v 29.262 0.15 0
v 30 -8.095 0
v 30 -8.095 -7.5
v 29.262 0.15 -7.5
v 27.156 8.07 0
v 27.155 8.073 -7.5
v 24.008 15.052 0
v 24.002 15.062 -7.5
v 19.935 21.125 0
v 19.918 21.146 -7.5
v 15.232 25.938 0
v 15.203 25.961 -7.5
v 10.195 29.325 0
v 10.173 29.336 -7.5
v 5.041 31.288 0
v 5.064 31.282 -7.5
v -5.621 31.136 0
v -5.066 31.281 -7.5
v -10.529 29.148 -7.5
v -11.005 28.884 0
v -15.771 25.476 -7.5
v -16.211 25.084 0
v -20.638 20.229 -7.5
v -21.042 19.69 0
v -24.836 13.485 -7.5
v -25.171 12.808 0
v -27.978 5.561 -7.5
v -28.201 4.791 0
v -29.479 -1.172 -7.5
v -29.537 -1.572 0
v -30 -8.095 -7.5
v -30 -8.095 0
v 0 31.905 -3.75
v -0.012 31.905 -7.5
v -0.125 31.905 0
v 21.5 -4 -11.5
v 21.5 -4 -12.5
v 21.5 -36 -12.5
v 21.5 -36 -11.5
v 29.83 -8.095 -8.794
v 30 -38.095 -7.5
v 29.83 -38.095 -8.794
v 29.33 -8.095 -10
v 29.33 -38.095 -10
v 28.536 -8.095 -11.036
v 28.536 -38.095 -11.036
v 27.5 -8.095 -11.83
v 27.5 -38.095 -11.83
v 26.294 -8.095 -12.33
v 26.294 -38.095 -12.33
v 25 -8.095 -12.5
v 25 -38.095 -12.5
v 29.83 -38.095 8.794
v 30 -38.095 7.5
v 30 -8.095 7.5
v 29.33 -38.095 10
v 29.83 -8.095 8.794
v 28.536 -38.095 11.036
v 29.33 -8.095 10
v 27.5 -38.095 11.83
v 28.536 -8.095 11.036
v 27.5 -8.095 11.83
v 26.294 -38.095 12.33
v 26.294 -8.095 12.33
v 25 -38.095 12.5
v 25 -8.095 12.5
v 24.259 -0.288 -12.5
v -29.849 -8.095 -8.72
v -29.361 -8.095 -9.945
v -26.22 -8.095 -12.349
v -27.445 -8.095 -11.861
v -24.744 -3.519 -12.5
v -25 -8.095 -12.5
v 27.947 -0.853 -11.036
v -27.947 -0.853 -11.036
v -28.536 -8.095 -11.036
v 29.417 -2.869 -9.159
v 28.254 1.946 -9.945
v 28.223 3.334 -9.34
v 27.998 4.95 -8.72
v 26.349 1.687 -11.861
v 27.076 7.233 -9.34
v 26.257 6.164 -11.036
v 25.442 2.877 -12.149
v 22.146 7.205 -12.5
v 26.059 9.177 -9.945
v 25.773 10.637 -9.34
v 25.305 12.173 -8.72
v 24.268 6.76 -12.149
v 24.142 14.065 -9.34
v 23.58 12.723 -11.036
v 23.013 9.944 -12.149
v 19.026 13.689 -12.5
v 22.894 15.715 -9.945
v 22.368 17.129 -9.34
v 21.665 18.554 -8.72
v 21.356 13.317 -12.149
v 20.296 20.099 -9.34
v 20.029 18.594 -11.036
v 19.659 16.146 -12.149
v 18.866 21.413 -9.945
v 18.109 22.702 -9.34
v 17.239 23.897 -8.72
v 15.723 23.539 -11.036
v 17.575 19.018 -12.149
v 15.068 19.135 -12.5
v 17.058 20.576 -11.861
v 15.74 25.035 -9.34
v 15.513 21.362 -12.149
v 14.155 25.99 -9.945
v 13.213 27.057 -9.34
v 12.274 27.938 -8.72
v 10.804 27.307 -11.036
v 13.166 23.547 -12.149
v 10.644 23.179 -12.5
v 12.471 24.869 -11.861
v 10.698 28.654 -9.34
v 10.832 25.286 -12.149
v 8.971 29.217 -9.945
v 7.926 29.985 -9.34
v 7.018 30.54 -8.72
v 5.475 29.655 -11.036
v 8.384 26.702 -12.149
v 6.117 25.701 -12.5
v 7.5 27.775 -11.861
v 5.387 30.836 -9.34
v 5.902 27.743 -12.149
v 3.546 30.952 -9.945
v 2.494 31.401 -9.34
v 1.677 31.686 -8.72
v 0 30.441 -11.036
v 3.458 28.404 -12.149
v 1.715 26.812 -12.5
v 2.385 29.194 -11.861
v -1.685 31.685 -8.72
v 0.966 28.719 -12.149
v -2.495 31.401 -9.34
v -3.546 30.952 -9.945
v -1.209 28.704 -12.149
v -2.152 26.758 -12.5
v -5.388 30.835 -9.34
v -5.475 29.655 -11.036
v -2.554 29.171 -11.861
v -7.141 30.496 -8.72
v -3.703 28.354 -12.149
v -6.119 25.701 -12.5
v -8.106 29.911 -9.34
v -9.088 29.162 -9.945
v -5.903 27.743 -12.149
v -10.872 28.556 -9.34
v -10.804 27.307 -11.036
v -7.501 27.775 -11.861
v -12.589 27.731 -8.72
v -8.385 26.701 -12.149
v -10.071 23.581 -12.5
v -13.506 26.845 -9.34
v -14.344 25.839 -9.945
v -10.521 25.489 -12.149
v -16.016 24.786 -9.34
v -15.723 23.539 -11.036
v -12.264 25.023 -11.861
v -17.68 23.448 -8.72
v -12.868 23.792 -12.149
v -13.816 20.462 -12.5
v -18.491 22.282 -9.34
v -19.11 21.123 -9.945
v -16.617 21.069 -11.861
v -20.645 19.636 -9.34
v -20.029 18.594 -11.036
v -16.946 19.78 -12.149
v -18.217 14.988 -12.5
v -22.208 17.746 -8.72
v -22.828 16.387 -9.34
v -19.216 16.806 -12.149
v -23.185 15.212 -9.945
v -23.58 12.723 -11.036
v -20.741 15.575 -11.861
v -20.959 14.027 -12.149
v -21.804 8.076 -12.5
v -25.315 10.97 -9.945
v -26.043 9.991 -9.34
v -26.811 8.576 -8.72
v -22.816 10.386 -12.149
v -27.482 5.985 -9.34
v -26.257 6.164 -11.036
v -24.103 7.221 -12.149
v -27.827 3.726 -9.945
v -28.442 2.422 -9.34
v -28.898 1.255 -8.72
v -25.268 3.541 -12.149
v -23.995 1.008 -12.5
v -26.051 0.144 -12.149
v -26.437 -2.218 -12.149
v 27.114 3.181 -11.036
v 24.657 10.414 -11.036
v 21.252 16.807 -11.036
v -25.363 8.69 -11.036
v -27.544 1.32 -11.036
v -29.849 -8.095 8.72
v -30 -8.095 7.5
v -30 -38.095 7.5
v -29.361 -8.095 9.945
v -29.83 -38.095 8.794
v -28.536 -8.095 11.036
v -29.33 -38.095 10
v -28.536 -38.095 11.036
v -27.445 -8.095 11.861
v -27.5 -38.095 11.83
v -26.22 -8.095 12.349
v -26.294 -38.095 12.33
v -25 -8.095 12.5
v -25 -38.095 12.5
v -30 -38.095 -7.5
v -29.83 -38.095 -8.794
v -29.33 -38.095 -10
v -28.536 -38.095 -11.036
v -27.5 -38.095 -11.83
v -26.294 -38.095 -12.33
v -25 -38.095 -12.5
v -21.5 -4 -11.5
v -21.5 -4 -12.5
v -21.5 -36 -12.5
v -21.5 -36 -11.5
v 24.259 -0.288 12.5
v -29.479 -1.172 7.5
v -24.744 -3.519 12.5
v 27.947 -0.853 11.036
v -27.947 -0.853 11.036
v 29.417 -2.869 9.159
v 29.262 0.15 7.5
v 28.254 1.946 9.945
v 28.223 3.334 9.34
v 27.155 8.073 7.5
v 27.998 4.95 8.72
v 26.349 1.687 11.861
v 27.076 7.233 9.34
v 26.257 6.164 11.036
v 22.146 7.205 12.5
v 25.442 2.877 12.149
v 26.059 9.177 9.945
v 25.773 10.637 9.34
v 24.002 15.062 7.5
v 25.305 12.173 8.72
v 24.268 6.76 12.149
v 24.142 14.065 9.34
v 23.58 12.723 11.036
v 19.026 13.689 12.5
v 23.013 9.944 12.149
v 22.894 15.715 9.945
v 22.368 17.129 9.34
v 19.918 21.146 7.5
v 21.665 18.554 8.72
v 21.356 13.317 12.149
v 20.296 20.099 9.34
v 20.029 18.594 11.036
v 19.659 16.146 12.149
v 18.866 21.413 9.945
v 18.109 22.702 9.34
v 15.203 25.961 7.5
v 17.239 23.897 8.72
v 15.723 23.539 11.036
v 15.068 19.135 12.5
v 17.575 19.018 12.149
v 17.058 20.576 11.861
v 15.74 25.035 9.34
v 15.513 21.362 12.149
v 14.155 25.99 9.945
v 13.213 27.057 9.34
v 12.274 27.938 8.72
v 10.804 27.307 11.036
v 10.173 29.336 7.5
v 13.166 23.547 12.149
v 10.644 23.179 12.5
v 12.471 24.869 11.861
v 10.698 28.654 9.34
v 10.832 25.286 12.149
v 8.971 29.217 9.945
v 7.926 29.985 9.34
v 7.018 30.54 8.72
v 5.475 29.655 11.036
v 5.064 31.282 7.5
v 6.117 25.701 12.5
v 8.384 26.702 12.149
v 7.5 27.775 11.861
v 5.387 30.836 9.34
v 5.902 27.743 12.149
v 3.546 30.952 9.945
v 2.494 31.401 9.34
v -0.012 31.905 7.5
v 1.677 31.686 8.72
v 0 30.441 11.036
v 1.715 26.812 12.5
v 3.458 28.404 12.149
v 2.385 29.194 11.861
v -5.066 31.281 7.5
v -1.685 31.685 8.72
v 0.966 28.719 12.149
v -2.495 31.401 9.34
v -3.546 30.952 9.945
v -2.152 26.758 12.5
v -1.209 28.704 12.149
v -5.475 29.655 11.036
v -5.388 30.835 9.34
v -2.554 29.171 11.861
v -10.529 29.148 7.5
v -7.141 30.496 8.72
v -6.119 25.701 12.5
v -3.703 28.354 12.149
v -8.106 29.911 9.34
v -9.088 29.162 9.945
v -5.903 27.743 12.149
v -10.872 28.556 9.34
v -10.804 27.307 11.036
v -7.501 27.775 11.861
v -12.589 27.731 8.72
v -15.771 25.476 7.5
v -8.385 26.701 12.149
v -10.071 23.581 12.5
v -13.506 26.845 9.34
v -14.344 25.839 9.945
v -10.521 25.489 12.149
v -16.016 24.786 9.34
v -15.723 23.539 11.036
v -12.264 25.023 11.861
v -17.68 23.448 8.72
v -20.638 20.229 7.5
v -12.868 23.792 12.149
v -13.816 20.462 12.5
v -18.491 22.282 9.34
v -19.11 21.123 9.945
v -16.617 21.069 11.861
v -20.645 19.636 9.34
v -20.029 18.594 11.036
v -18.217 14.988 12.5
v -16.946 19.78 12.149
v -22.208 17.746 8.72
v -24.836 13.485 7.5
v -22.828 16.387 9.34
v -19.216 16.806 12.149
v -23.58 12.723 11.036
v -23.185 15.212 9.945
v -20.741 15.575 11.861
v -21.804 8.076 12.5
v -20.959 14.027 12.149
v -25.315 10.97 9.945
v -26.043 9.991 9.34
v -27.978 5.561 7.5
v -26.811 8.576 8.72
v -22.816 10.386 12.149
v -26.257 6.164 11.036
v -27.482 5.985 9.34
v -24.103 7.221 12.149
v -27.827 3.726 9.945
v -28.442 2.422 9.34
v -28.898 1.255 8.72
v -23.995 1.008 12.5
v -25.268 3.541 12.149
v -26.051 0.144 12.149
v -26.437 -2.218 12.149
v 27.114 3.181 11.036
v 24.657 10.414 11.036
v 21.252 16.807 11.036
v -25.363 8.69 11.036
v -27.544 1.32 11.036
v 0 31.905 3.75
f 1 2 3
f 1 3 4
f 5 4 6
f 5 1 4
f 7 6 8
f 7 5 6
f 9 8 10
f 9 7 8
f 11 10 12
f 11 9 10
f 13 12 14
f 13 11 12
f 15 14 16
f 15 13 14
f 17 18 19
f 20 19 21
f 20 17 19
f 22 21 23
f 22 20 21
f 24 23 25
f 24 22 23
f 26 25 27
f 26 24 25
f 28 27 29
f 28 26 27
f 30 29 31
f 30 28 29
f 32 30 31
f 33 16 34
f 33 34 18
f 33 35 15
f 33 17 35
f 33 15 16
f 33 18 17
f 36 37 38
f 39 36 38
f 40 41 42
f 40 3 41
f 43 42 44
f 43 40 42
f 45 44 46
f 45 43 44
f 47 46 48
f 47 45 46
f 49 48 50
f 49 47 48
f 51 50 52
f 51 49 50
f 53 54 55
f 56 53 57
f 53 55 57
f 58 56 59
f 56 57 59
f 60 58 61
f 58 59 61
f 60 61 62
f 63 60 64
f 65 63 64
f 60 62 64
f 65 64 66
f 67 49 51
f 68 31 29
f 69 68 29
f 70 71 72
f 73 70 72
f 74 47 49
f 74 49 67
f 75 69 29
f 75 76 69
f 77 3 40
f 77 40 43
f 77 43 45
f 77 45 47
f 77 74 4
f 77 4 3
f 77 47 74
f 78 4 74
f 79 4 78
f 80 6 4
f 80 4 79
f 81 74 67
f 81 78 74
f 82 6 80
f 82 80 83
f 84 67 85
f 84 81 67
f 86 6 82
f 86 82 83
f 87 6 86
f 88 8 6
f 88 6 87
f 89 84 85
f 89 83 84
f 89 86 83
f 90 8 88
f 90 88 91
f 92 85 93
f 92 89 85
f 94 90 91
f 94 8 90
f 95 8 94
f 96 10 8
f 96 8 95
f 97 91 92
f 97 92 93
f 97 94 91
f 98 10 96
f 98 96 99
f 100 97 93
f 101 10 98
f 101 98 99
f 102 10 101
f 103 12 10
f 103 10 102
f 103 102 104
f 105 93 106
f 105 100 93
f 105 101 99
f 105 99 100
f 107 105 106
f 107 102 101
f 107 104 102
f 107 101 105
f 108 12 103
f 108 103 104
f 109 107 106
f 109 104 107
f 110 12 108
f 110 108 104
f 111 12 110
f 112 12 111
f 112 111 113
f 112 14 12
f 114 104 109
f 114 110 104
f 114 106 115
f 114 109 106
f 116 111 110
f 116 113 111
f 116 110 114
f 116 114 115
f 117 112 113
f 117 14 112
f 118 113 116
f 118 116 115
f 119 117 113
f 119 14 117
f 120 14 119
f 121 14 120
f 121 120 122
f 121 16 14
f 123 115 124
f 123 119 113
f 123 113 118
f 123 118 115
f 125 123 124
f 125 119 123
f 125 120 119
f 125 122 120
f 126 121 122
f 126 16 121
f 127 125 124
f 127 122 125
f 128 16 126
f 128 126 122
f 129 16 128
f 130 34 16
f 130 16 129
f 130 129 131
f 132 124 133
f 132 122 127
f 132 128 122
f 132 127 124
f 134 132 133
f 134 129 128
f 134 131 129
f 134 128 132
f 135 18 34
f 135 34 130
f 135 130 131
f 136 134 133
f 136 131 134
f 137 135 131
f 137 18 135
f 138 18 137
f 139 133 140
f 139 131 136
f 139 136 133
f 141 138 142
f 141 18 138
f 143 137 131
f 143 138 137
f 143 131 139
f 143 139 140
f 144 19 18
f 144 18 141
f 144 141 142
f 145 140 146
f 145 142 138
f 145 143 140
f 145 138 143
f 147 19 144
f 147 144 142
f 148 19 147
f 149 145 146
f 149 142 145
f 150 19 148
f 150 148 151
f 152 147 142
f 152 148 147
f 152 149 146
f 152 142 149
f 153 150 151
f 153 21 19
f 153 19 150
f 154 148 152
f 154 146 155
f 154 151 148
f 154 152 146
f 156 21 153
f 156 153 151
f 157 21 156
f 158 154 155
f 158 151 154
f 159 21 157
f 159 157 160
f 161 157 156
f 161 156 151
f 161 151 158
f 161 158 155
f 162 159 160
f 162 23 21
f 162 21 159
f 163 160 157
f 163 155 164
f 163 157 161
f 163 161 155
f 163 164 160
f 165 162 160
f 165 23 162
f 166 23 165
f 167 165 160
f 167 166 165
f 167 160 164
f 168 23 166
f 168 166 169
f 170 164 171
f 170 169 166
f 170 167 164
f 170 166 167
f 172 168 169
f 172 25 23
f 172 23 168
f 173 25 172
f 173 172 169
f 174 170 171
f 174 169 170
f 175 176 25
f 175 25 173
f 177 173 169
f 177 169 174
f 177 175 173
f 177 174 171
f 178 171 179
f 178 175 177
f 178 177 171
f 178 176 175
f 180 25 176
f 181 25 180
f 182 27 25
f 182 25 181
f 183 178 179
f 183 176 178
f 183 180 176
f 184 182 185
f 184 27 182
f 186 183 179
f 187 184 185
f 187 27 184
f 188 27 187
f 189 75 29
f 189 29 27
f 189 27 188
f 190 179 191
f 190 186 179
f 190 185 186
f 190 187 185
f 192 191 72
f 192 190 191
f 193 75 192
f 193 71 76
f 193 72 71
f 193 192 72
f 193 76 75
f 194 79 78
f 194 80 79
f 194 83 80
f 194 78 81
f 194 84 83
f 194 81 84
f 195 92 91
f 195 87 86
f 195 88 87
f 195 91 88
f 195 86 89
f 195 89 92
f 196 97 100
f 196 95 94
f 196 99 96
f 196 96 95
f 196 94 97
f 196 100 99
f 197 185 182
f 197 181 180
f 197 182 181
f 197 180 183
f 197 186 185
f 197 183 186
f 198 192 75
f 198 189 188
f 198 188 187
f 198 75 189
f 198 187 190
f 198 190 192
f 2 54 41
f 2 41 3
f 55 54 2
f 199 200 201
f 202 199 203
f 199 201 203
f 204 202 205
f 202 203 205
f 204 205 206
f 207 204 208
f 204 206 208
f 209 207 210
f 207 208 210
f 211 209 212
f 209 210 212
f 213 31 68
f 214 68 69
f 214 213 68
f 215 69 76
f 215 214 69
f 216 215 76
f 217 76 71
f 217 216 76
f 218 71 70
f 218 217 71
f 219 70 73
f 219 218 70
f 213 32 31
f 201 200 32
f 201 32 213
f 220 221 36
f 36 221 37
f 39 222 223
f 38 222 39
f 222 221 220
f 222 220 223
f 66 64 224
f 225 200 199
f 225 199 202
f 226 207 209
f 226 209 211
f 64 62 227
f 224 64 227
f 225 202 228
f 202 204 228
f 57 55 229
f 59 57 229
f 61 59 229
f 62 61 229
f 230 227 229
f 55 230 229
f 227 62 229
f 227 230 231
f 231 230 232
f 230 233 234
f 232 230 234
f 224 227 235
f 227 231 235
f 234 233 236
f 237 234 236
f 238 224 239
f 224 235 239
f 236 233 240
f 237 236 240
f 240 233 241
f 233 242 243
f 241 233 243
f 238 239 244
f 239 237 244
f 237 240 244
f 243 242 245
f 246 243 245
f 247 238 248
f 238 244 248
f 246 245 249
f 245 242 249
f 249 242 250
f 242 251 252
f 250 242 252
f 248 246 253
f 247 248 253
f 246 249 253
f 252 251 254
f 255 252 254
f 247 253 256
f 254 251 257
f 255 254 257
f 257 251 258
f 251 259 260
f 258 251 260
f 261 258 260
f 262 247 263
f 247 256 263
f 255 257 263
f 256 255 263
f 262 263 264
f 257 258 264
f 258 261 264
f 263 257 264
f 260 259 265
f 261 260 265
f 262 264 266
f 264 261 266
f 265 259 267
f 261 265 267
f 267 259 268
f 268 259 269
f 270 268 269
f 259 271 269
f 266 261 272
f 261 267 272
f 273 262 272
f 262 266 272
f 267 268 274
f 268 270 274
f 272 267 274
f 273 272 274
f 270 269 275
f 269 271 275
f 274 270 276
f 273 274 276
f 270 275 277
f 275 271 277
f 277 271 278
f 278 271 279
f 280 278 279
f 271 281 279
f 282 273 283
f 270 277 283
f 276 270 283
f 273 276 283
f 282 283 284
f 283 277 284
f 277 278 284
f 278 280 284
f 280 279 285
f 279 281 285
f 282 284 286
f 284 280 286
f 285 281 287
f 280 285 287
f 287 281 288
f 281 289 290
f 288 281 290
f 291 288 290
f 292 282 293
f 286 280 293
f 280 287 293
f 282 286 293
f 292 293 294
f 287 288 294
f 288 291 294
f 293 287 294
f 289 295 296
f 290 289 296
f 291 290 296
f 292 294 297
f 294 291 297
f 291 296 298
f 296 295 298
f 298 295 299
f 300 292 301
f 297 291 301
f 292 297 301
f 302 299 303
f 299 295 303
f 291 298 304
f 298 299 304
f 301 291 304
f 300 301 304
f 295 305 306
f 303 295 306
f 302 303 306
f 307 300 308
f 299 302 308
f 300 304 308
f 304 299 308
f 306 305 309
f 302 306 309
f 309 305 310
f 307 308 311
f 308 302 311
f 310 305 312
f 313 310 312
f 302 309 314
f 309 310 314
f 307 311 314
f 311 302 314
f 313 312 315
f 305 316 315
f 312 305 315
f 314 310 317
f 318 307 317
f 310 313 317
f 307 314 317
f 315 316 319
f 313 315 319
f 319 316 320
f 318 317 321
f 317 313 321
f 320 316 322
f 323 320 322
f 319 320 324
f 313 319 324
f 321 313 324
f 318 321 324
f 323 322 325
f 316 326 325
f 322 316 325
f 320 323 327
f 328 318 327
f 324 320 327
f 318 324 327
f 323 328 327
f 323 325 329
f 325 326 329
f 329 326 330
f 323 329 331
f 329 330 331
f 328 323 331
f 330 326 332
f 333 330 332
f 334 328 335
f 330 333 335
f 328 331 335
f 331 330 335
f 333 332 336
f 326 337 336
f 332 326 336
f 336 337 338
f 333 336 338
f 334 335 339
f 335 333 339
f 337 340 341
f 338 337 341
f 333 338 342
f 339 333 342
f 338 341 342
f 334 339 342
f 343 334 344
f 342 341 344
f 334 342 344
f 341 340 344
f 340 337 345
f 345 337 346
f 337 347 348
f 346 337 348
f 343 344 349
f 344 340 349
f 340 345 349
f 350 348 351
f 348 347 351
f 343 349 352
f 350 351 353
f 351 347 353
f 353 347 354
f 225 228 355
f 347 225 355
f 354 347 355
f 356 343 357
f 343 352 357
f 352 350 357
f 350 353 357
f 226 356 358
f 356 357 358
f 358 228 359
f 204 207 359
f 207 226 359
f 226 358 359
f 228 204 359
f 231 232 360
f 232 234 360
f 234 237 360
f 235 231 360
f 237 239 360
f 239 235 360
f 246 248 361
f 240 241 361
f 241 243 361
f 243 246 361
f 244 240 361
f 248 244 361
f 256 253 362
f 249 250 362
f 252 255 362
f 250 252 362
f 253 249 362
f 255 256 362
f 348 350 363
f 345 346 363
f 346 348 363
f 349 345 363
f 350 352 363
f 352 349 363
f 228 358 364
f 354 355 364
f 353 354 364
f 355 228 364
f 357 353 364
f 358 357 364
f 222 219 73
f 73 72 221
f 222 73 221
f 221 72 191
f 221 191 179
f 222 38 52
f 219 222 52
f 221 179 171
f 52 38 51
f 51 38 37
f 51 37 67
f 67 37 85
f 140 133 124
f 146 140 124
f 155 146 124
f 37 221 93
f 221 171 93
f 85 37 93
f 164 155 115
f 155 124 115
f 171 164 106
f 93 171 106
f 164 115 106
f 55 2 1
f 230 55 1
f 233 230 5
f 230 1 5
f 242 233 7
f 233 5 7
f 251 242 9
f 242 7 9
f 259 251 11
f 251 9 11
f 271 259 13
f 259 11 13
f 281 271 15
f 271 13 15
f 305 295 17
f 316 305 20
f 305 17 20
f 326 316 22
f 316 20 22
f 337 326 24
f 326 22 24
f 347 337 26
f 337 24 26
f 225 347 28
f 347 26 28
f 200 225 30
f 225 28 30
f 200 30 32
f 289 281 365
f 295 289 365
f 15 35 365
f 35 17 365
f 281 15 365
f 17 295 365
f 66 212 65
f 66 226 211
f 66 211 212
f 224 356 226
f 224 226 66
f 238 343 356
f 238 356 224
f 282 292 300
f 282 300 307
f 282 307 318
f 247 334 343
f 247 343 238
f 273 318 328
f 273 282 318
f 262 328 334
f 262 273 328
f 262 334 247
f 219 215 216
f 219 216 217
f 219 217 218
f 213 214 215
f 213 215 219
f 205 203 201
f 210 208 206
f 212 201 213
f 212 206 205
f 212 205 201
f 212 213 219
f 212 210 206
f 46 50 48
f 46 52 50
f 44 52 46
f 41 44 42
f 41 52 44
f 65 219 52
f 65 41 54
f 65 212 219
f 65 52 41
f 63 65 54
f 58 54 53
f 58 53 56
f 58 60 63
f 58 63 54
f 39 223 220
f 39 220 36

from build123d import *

# Parameters (mm, degrees)
F1_DEPTH = 12.5
F2_R     = 5
F3_W     = 43
F3_H     = 32
F4_DEPTH = 1


# Not quite as in the source:
# - ends of sketch curves that miss each other by under 0.0002 mm in the source are joined


with BuildPart() as f1:
    # F0 (on Top) → F1 (new body, symmetric)
    with BuildSketch(Plane.XY):
        with BuildLine():
            Line((-30, -8.0950134536), (-30, -38.0950163982))
            Line((-30, -38.0950163982), (0, -38.0950163982))
            ThreePointArc((0, -38.0950163982), (-21.2132044767, -29.3082187928), (-30, -8.0950134536))
        make_face()
        with BuildLine():
            ThreePointArc((30, -8.0950163982), (21.2132034356, -29.3082198338), (0, -38.0950163982))
            Line((0, -38.0950163982), (30, -38.0950163982))
            Line((30, -38.0950163982), (30, -8.0950163982))
        make_face()
        with BuildLine():
            ThreePointArc((-30, -8.0950134536), (-21.2132044767, -29.3082187928), (0, -38.0950163982))
            ThreePointArc((0, -38.0950163982), (21.2132034356, -29.3082198338), (30, -8.0950163982))
            ThreePointArc((30, -8.0950163982), (1.4723e-06, 21.9049836018), (-30, -8.0950134536))
        make_face()
        with BuildLine():
            add(Edge.make_bspline(
                [(0, 31.9049836018), (-16.629870981, 31.9049836018), (-30, 11.955471457), (-30, -8.0950134536)],
                knots=[0, 0, 0, 0, 49.9999976443, 49.9999976443, 49.9999976443, 49.9999976443], degree=3))
            ThreePointArc((-30, -8.0950134536), (1.4723e-06, 21.9049836018), (30, -8.0950163982))
            add(Edge.make_bspline(
                [(0, 31.9049836018), (16.629870981, 31.9049836018), (30, 11.955471457), (30, -8.0950163982)],
                knots=[0, 0, 0, 0, 49.9999976443, 49.9999976443, 49.9999976443, 49.9999976443], degree=3))
        make_face()
    extrude(amount=F1_DEPTH, both=True)

    # F2
    f2_edges = [f1.edges().sort_by_distance(p)[0] for p in [
        (30, -23.095016, -12.5),
        (30, -23.095016, 12.5),
        (-30, -23.095015, 12.5),
        (-30, -23.095015, -12.5),
    ]]
    fillet(f2_edges, radius=F2_R)

    # F3 (on face) → F4 (cut)
    with BuildSketch(Plane(origin=(0, 0, -12.5), x_dir=(1, 0, 0), z_dir=(0, 0, -1))):
        with Locations((0, 20)):
            Rectangle(F3_W, F3_H)
    extrude(amount=-F4_DEPTH, mode=Mode.SUBTRACT)


solid = f1.part
